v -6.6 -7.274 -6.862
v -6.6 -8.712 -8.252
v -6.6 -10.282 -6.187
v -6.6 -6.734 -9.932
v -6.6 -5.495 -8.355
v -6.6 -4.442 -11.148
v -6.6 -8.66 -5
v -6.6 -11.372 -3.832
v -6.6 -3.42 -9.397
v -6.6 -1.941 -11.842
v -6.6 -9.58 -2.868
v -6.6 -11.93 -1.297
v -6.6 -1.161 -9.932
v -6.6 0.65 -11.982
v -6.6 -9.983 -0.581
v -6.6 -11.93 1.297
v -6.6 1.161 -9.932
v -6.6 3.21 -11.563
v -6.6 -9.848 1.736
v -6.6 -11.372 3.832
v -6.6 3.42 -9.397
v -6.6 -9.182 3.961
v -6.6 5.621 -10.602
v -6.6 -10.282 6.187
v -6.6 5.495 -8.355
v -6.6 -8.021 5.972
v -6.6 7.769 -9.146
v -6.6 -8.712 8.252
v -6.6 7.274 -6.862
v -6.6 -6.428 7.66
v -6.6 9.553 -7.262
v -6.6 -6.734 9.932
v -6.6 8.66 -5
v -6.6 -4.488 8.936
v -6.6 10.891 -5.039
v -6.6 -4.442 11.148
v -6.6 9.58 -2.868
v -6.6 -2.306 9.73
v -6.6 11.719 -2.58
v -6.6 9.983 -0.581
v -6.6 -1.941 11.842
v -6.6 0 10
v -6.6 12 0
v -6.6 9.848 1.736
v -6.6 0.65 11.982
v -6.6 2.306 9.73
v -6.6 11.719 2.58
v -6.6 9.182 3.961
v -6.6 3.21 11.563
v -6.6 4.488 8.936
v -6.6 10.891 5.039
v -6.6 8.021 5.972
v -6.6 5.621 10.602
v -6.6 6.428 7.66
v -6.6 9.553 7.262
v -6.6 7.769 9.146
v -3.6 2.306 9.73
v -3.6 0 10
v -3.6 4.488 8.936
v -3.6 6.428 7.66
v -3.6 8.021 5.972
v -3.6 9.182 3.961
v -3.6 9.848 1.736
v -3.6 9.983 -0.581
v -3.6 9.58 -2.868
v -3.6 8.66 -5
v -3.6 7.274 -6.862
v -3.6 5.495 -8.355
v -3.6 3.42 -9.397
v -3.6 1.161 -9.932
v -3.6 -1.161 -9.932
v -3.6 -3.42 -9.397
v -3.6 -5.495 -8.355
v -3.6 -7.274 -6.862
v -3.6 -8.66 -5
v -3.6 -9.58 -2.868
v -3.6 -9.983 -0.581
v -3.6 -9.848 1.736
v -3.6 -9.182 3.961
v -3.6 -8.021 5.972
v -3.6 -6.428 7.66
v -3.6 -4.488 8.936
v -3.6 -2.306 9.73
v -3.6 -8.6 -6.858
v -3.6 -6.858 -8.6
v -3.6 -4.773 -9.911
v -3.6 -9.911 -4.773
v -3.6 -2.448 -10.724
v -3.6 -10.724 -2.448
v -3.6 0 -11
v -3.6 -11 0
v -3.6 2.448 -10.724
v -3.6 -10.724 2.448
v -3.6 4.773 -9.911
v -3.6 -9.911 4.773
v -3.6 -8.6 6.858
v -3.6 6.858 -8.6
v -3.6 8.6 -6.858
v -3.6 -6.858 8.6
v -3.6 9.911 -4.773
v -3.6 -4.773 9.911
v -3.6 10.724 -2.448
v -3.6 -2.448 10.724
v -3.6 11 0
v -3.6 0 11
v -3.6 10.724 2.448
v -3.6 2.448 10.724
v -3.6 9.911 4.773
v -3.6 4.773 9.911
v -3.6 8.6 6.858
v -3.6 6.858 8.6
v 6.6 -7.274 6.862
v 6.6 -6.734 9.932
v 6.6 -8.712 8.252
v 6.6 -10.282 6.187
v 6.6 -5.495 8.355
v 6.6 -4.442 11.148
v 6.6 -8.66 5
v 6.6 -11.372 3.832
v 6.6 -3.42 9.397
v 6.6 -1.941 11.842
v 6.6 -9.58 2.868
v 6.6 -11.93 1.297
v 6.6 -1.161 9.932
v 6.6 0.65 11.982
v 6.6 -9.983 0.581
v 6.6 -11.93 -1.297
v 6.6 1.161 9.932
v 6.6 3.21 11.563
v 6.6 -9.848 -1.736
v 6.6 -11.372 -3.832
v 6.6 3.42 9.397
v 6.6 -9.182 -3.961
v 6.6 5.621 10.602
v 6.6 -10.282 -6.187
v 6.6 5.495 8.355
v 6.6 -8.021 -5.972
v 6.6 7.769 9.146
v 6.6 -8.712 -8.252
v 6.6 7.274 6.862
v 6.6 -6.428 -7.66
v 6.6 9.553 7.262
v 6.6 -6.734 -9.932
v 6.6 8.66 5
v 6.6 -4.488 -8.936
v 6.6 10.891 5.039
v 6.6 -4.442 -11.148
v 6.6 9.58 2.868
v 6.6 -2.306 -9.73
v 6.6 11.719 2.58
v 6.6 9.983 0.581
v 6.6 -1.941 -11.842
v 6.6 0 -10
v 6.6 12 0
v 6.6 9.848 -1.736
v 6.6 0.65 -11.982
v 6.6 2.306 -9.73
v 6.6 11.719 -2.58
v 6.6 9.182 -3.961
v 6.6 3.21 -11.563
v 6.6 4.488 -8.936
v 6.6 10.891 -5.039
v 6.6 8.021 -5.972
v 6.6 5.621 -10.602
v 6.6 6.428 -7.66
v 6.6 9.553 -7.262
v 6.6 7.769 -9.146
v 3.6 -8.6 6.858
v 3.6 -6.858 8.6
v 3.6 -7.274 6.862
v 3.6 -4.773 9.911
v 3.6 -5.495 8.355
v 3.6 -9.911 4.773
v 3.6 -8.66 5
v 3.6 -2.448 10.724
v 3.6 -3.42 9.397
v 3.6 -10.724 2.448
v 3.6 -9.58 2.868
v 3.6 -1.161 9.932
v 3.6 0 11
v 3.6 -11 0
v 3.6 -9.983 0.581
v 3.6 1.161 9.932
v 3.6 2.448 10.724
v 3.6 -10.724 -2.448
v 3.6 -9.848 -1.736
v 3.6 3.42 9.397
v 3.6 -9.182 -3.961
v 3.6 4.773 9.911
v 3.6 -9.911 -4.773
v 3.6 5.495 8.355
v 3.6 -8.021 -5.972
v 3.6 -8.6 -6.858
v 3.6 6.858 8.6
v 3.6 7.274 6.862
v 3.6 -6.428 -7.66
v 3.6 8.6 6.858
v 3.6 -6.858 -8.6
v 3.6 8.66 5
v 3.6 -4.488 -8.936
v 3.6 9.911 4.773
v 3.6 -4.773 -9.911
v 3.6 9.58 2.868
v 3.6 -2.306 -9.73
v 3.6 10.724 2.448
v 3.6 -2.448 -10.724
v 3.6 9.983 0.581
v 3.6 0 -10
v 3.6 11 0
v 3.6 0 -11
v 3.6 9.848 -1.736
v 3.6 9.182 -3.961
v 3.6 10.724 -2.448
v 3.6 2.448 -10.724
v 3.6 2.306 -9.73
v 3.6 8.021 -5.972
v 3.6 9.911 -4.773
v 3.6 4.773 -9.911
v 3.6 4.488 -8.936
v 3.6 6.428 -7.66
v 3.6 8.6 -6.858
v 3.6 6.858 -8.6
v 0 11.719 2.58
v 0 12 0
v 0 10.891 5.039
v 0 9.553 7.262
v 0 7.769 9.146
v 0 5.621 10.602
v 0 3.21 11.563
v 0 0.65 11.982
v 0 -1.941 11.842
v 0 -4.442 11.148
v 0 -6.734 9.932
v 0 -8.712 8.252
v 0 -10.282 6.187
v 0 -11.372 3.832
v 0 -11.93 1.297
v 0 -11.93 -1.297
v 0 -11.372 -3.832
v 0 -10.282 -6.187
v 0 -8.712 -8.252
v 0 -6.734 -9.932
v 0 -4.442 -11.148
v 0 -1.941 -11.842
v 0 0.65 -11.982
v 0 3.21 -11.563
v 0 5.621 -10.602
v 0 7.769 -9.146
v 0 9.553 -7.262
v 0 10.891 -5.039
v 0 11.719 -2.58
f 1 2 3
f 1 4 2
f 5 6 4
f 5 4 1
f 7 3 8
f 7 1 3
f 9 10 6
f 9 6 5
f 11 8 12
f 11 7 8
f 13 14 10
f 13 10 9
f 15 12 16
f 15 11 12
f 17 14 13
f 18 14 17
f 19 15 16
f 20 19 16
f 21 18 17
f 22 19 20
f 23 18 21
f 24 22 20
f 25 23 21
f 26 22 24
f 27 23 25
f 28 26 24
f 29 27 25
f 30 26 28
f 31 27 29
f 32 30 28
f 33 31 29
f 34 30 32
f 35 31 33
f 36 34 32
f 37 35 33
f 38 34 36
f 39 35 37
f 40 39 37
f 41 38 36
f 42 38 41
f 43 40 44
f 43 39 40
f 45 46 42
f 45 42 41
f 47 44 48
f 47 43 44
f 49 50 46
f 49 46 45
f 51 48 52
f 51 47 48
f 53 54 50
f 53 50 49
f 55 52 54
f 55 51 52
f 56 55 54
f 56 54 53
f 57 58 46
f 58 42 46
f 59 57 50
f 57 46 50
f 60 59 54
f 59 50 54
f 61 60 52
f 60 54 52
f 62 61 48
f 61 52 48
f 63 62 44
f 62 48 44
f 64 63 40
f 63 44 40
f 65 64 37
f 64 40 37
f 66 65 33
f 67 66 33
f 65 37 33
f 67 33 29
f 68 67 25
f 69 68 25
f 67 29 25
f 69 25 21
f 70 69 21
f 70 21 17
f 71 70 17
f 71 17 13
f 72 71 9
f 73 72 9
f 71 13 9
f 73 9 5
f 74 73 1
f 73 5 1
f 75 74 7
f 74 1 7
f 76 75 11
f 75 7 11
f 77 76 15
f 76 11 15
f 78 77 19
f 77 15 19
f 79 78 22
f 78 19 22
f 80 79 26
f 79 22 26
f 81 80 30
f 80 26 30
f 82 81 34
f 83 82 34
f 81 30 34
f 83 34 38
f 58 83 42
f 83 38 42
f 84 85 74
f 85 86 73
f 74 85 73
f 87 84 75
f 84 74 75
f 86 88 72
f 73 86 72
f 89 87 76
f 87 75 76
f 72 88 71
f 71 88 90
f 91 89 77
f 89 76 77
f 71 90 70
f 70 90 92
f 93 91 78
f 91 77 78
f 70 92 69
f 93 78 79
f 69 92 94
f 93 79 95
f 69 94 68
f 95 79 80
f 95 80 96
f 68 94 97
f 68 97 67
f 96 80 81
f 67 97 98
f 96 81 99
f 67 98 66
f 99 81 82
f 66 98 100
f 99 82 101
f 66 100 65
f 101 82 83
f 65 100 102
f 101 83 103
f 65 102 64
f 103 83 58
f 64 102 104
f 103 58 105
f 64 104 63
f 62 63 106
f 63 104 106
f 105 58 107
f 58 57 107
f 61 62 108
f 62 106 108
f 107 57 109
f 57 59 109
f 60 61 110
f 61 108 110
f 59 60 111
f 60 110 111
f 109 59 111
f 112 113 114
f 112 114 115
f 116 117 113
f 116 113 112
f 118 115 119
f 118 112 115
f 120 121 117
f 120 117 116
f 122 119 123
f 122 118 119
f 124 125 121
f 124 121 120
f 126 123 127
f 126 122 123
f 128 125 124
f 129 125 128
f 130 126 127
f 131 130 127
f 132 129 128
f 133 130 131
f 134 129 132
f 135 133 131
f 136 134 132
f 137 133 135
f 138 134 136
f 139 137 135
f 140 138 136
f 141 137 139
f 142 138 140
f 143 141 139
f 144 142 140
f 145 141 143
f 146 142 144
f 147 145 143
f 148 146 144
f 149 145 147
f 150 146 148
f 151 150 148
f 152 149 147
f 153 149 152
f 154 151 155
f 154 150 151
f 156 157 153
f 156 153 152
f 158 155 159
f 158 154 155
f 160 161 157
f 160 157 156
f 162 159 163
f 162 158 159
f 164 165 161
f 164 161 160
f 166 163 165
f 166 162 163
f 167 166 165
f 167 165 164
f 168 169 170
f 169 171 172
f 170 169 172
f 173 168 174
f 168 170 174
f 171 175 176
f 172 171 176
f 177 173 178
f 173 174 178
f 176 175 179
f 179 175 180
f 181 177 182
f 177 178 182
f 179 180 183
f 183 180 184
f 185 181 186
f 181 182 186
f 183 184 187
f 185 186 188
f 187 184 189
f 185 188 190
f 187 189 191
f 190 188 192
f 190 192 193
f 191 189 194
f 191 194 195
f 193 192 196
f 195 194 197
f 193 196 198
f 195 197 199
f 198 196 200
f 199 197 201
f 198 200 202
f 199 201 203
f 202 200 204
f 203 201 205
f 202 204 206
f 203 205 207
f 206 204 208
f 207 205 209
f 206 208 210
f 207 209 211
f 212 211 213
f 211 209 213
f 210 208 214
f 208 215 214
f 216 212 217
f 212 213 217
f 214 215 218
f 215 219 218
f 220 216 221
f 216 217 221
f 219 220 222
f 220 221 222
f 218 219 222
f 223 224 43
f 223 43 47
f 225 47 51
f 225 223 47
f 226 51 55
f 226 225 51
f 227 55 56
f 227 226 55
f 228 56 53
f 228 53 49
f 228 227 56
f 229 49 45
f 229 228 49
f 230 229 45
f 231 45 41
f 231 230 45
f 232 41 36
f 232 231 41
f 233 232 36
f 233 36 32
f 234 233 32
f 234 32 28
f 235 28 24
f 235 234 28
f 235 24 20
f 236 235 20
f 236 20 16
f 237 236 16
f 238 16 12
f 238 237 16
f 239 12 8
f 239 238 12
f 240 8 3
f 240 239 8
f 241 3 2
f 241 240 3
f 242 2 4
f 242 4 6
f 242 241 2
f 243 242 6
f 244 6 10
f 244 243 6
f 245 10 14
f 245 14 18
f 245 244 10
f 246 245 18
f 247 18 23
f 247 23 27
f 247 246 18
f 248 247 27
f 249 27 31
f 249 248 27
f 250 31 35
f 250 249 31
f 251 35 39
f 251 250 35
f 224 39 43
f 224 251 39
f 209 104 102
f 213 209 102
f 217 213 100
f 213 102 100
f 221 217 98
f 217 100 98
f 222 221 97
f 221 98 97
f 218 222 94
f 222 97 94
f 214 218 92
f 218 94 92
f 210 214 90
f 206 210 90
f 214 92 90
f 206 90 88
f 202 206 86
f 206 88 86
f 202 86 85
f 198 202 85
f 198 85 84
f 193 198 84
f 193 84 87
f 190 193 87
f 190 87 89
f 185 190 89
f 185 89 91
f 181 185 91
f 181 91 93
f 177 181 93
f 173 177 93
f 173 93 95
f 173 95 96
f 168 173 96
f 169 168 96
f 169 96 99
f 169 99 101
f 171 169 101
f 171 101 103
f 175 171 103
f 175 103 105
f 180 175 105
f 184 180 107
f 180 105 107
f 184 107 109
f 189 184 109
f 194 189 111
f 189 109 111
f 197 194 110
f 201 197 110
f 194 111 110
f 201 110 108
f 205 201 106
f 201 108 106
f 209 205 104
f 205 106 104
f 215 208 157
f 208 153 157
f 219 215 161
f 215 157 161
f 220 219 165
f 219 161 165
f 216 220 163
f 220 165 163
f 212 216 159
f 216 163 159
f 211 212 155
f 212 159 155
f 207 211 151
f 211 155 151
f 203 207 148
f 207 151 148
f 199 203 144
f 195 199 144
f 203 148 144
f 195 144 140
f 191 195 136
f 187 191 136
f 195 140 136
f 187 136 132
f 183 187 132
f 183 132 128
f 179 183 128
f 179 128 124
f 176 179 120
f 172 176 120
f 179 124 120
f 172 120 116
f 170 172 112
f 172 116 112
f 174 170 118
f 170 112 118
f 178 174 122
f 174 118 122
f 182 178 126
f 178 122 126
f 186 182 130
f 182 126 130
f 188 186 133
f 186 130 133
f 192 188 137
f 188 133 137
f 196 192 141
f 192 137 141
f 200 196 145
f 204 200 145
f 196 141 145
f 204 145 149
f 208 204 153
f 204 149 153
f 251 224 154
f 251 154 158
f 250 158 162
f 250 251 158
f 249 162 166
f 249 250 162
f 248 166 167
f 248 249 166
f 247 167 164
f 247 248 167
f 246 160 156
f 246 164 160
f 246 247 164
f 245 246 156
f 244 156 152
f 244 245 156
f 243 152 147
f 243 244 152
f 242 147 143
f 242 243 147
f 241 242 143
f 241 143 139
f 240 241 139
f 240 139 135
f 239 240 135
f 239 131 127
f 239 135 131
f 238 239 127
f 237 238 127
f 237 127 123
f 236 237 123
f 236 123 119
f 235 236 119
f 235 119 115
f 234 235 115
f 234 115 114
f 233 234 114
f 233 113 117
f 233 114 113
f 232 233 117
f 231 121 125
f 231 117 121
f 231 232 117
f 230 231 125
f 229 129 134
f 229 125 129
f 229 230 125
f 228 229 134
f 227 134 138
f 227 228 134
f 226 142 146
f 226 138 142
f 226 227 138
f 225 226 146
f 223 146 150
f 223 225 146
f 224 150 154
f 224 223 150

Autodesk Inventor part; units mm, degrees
ref_plane "YZ Plane" through (0, 0, 0) normal (1, 0, 0) x (0, 1, 0)
ref_plane "XZ Plane" through (0, 0, 0) normal (0, 1, 0) x (-1, 0, 0)
ref_plane "XY Plane" through (0, 0, 0) normal (0, 0, 1) x (1, 0, 0)
sketch "Sketch1" plane through (0, 0, 0) normal (1, 0, 0) x (0, 1, 0)
  circle A0 centre (0, 0) radius 12
  circle A1 centre (0, 0) radius 11
  dimension "d0" = 24
  dimension "d1" = 22
extrude "Extrusion1" add sketch "Sketch1" along normal mid plane 13.2
sketch "Sketch4" plane through (-6.6, 0, 0) normal (-1, 0, 0) x (0, 0, 1)
  circle A0 centre (0, 0) radius 10
  circle A1 centre (0, 0) radius 11
  dimension "d9" = 20
  dimension "d10" = 22
extrude "Extrusion3" add sketch "Sketch4" against normal blind 3
sketch "Sketch5" plane through (6.6, 0, 0) normal (1, 0, 0) x (0, 0, -1)
  circle A0 centre (0, 0) radius 10
  circle A1 centre (0, 0) radius 11
  dimension "d13" = 20
  dimension "d14" = 22
extrude "Extrusion4" add sketch "Sketch5" against normal blind 3
equation "\"d0\" = BearingDiameter"
equation "\"d2\" = BearingSiliconeWidth"
equation "\"BearingDiameter\" = 24"
equation "\"BearingSiliconeWidth\" = 13.2"
properties part number "Bearing_Silicone" material "UHMW, White"
